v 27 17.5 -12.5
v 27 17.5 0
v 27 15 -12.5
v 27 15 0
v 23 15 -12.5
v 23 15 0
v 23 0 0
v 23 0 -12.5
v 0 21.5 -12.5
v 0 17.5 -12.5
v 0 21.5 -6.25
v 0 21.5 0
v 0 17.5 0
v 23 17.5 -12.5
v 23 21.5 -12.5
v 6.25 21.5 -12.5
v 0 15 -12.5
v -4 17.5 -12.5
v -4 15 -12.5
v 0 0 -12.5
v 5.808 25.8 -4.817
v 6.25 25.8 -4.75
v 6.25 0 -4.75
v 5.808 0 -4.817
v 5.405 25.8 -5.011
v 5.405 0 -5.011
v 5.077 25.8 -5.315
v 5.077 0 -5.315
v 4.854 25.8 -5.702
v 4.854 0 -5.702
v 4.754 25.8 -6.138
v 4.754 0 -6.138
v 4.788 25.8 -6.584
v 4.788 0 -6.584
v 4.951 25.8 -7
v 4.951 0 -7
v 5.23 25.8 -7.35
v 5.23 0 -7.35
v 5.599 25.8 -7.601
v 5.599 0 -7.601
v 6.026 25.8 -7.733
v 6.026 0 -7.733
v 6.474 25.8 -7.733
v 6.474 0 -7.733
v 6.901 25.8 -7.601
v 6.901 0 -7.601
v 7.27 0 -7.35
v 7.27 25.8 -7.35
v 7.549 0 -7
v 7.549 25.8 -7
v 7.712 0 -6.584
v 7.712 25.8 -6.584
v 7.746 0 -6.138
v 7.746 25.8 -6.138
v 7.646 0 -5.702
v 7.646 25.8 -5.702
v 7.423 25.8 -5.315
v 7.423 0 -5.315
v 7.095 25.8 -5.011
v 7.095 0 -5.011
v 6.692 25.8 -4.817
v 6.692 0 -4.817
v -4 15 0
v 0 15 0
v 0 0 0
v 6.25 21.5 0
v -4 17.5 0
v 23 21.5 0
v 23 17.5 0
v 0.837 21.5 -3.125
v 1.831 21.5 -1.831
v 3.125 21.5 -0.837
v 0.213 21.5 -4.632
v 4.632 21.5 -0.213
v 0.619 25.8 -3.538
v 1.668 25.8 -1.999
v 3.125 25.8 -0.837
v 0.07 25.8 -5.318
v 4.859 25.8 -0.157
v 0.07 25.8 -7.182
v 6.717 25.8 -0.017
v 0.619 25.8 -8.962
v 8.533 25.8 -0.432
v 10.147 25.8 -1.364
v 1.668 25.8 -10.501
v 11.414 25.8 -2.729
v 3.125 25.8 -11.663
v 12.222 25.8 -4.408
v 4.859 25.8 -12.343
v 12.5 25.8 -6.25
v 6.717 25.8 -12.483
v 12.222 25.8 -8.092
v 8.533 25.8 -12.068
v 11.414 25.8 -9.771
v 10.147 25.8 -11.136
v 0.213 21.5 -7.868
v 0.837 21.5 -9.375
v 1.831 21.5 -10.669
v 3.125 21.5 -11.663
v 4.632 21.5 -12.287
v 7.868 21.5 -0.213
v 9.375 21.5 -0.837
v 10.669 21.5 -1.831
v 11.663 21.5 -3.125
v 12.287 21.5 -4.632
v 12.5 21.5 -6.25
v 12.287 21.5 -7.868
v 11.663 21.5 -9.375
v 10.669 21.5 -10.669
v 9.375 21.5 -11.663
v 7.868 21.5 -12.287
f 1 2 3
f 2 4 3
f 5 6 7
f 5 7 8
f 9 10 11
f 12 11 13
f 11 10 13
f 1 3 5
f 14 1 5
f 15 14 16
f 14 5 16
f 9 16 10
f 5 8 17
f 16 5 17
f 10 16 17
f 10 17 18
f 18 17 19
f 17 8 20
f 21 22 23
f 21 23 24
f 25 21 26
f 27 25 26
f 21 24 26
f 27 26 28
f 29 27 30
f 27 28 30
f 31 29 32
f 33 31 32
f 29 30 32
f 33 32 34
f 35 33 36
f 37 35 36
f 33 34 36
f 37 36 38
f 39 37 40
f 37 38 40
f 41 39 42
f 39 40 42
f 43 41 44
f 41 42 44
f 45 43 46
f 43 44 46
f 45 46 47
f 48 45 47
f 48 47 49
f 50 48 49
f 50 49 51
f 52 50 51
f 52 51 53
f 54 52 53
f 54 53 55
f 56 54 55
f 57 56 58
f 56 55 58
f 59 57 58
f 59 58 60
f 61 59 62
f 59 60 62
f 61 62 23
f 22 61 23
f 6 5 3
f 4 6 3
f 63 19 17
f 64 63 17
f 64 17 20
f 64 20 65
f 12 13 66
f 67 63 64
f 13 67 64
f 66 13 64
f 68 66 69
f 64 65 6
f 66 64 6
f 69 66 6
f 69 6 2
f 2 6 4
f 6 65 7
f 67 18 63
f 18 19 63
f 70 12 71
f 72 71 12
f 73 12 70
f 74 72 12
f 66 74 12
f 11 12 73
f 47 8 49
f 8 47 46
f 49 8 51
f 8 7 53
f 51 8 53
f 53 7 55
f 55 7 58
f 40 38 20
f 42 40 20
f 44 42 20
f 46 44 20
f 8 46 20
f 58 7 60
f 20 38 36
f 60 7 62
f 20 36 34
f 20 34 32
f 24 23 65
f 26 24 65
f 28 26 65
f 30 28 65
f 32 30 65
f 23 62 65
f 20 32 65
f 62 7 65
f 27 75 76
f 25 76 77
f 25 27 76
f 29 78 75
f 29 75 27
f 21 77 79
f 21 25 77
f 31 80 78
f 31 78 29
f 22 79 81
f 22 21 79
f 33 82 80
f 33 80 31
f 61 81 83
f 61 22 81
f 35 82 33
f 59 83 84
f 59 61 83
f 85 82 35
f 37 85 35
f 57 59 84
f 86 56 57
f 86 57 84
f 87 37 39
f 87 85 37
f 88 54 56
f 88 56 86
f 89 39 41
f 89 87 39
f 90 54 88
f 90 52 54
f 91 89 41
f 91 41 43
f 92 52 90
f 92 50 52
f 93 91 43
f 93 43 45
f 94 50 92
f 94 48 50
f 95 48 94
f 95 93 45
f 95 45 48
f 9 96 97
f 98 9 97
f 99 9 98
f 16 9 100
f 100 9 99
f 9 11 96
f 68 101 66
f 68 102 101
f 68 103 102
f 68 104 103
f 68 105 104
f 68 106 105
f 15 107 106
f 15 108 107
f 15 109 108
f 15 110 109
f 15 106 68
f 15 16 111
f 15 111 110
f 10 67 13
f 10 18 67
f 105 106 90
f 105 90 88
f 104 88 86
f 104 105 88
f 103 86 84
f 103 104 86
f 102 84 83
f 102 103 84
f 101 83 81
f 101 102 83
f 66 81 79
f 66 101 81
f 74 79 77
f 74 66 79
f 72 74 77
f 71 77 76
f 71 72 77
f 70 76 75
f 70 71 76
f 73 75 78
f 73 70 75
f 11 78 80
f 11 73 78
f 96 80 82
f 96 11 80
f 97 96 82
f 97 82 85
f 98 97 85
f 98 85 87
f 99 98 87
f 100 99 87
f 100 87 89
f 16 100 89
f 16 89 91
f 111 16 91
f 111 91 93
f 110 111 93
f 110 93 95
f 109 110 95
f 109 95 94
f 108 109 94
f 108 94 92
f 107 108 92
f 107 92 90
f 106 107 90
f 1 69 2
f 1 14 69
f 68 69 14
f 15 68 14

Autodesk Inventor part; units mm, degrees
ref_plane "YZ Plane" through (0, 0, 0) normal (1, 0, 0) x (0, 1, 0)
ref_plane "XZ Plane" through (0, 0, 0) normal (0, 1, 0) x (-1, 0, 0)
ref_plane "XY Plane" through (0, 0, 0) normal (0, 0, 1) x (1, 0, 0)
sketch "スケッチ1" plane through (0, 0, 0) normal (0, 1, 0) x (-1, 0, 0)
  line L0 (0, 0) -> (-23, 0)
  line L1 (-23, 0) -> (-23, -12.5)
  line L2 (-23, -12.5) -> (0, -12.5)
  line L3 (0, -12.5) -> (0, 0)
  dimension "d0" = 23
  dimension "d1" = 12.5
extrude "押し出し1" add sketch "スケッチ1" along normal blind 15
sketch "スケッチ2" plane through (0, 15, 0) normal (0, 1, 0) x (1, 0, 0)
  line L0 (23, 0) -> (23, 12.5) projected
  line L1 (23, 12.5) -> (0, 12.5) projected
  line L2 (0, 12.5) -> (0, 0) projected
  line L3 (0, 0) -> (23, 0) projected
  line L4 (-4, 0) -> (27, 0)
  line L5 (27, 0) -> (27, 12.5)
  line L6 (27, 12.5) -> (-4, 12.5)
  line L7 (-4, 12.5) -> (-4, 0)
  dimension "d4" = 4
  dimension "d5" = 4
extrude "押し出し2" add sketch "スケッチ2" along normal blind 2.5
sketch "スケッチ3" plane through (0, 17.5, 0) normal (0, 1, 0) x (1, 0, 0)
  line L0 (-4, 0) -> (27, 0) projected
  line L1 (27, 12.5) -> (-4, 12.5) projected
  line L2 (0, 12.5) -> (0, 0) projected
  line L3 (23, 0) -> (23, 12.5) projected
extrude "押し出し3" add sketch "スケッチ3" along normal blind 4
sketch "スケッチ4" plane through (0, 21.5, 0) normal (0, 1, 0) x (1, 0, 0)
  line L0 (23, 12.5) -> (0, 12.5) projected
  line L1 (0, 12.5) -> (0, 0) projected
  line L2 (0, 0) -> (23, 0) projected
  circle A0 centre (6.25, 6.25) radius 6.25
extrude "押し出し4" add sketch "スケッチ4" along normal blind 4.3 contours A0
sketch "スケッチ5" plane through (6.25, 25.8, -6.25) normal (0, 1, 0) x (1, 0, 0)
  circle A0 centre (0, 0) radius 6.25 projected
  point P0 (-6.25, -6.25)
hole "穴1" at (6.25, 25.8, -6.25) direction (0, -1, 0) diameter 3 end through all
equation "\"d5\" = d4"
properties part number "ServoMotor_10g"
